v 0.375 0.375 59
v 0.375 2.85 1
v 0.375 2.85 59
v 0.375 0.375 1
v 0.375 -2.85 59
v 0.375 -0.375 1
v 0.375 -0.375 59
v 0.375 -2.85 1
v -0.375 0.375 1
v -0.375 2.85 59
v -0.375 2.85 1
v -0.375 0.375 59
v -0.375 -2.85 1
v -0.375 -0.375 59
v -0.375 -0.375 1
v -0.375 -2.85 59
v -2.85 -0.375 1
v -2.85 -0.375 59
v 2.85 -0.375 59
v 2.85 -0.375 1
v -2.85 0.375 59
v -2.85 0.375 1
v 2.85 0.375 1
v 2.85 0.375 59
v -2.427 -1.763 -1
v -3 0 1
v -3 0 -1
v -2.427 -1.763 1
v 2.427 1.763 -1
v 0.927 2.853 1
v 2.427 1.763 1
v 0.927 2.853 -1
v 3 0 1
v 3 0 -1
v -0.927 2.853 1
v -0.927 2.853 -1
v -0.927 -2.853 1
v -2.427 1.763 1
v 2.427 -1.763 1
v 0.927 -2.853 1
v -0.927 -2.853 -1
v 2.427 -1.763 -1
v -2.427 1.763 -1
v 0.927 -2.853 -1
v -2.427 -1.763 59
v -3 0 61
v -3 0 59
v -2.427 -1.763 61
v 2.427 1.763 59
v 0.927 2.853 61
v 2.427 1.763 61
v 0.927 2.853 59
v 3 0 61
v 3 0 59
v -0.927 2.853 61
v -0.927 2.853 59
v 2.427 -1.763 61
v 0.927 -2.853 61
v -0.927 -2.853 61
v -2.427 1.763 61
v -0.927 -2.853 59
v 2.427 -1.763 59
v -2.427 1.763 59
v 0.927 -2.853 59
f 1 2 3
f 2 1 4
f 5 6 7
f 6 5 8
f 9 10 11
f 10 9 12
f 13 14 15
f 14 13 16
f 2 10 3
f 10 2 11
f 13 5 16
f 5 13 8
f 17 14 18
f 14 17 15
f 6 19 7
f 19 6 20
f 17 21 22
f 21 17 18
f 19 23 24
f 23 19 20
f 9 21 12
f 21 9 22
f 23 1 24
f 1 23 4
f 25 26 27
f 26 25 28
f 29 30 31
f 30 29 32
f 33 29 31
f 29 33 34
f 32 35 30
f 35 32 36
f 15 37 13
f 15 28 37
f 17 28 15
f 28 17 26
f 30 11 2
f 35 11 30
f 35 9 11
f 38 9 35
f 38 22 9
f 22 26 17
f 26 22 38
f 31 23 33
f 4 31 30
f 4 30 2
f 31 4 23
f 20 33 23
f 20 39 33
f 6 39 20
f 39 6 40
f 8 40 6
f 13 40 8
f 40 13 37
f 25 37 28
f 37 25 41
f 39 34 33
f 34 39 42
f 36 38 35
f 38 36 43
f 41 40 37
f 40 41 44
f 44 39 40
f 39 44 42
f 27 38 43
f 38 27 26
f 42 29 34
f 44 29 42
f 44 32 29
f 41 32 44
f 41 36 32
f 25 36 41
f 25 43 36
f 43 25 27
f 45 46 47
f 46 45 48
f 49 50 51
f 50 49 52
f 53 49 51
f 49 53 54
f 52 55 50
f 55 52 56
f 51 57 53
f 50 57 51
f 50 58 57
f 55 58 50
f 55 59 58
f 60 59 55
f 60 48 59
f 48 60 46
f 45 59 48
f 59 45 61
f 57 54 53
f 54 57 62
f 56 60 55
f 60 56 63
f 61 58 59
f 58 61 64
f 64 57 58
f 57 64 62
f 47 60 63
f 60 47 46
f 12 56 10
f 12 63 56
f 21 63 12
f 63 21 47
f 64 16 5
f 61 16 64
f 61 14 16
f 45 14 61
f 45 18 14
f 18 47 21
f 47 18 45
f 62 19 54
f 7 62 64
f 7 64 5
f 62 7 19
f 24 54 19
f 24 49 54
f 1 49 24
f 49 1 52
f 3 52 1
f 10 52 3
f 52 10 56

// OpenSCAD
height = 60;
cap_radius = 3;
cap_height = 2;
beam_x = .75;
// cap_radius*2 will extend beam to the edge of cap
beam_y = cap_radius*2 - .3;

// x-beam, centered between two caps
translate([0,0,height/2]) {
    // cube 1
    cube(size = [beam_x,beam_y,height], center = true);
    // cube 2, twisted 90 in z
    color("red")  rotate([0,0,90]) {
      cube(size = [beam_x,beam_y,height], center = true);
    }
}

// bottom cap
color("blue")  cylinder(h = cap_height, r1 = cap_radius, r2 = cap_radius, center = true);

// top cap
color("green")  translate([0,0,height])
{
  cylinder(h = cap_height, r1 = cap_radius, r2 = cap_radius, center = true); 
}
